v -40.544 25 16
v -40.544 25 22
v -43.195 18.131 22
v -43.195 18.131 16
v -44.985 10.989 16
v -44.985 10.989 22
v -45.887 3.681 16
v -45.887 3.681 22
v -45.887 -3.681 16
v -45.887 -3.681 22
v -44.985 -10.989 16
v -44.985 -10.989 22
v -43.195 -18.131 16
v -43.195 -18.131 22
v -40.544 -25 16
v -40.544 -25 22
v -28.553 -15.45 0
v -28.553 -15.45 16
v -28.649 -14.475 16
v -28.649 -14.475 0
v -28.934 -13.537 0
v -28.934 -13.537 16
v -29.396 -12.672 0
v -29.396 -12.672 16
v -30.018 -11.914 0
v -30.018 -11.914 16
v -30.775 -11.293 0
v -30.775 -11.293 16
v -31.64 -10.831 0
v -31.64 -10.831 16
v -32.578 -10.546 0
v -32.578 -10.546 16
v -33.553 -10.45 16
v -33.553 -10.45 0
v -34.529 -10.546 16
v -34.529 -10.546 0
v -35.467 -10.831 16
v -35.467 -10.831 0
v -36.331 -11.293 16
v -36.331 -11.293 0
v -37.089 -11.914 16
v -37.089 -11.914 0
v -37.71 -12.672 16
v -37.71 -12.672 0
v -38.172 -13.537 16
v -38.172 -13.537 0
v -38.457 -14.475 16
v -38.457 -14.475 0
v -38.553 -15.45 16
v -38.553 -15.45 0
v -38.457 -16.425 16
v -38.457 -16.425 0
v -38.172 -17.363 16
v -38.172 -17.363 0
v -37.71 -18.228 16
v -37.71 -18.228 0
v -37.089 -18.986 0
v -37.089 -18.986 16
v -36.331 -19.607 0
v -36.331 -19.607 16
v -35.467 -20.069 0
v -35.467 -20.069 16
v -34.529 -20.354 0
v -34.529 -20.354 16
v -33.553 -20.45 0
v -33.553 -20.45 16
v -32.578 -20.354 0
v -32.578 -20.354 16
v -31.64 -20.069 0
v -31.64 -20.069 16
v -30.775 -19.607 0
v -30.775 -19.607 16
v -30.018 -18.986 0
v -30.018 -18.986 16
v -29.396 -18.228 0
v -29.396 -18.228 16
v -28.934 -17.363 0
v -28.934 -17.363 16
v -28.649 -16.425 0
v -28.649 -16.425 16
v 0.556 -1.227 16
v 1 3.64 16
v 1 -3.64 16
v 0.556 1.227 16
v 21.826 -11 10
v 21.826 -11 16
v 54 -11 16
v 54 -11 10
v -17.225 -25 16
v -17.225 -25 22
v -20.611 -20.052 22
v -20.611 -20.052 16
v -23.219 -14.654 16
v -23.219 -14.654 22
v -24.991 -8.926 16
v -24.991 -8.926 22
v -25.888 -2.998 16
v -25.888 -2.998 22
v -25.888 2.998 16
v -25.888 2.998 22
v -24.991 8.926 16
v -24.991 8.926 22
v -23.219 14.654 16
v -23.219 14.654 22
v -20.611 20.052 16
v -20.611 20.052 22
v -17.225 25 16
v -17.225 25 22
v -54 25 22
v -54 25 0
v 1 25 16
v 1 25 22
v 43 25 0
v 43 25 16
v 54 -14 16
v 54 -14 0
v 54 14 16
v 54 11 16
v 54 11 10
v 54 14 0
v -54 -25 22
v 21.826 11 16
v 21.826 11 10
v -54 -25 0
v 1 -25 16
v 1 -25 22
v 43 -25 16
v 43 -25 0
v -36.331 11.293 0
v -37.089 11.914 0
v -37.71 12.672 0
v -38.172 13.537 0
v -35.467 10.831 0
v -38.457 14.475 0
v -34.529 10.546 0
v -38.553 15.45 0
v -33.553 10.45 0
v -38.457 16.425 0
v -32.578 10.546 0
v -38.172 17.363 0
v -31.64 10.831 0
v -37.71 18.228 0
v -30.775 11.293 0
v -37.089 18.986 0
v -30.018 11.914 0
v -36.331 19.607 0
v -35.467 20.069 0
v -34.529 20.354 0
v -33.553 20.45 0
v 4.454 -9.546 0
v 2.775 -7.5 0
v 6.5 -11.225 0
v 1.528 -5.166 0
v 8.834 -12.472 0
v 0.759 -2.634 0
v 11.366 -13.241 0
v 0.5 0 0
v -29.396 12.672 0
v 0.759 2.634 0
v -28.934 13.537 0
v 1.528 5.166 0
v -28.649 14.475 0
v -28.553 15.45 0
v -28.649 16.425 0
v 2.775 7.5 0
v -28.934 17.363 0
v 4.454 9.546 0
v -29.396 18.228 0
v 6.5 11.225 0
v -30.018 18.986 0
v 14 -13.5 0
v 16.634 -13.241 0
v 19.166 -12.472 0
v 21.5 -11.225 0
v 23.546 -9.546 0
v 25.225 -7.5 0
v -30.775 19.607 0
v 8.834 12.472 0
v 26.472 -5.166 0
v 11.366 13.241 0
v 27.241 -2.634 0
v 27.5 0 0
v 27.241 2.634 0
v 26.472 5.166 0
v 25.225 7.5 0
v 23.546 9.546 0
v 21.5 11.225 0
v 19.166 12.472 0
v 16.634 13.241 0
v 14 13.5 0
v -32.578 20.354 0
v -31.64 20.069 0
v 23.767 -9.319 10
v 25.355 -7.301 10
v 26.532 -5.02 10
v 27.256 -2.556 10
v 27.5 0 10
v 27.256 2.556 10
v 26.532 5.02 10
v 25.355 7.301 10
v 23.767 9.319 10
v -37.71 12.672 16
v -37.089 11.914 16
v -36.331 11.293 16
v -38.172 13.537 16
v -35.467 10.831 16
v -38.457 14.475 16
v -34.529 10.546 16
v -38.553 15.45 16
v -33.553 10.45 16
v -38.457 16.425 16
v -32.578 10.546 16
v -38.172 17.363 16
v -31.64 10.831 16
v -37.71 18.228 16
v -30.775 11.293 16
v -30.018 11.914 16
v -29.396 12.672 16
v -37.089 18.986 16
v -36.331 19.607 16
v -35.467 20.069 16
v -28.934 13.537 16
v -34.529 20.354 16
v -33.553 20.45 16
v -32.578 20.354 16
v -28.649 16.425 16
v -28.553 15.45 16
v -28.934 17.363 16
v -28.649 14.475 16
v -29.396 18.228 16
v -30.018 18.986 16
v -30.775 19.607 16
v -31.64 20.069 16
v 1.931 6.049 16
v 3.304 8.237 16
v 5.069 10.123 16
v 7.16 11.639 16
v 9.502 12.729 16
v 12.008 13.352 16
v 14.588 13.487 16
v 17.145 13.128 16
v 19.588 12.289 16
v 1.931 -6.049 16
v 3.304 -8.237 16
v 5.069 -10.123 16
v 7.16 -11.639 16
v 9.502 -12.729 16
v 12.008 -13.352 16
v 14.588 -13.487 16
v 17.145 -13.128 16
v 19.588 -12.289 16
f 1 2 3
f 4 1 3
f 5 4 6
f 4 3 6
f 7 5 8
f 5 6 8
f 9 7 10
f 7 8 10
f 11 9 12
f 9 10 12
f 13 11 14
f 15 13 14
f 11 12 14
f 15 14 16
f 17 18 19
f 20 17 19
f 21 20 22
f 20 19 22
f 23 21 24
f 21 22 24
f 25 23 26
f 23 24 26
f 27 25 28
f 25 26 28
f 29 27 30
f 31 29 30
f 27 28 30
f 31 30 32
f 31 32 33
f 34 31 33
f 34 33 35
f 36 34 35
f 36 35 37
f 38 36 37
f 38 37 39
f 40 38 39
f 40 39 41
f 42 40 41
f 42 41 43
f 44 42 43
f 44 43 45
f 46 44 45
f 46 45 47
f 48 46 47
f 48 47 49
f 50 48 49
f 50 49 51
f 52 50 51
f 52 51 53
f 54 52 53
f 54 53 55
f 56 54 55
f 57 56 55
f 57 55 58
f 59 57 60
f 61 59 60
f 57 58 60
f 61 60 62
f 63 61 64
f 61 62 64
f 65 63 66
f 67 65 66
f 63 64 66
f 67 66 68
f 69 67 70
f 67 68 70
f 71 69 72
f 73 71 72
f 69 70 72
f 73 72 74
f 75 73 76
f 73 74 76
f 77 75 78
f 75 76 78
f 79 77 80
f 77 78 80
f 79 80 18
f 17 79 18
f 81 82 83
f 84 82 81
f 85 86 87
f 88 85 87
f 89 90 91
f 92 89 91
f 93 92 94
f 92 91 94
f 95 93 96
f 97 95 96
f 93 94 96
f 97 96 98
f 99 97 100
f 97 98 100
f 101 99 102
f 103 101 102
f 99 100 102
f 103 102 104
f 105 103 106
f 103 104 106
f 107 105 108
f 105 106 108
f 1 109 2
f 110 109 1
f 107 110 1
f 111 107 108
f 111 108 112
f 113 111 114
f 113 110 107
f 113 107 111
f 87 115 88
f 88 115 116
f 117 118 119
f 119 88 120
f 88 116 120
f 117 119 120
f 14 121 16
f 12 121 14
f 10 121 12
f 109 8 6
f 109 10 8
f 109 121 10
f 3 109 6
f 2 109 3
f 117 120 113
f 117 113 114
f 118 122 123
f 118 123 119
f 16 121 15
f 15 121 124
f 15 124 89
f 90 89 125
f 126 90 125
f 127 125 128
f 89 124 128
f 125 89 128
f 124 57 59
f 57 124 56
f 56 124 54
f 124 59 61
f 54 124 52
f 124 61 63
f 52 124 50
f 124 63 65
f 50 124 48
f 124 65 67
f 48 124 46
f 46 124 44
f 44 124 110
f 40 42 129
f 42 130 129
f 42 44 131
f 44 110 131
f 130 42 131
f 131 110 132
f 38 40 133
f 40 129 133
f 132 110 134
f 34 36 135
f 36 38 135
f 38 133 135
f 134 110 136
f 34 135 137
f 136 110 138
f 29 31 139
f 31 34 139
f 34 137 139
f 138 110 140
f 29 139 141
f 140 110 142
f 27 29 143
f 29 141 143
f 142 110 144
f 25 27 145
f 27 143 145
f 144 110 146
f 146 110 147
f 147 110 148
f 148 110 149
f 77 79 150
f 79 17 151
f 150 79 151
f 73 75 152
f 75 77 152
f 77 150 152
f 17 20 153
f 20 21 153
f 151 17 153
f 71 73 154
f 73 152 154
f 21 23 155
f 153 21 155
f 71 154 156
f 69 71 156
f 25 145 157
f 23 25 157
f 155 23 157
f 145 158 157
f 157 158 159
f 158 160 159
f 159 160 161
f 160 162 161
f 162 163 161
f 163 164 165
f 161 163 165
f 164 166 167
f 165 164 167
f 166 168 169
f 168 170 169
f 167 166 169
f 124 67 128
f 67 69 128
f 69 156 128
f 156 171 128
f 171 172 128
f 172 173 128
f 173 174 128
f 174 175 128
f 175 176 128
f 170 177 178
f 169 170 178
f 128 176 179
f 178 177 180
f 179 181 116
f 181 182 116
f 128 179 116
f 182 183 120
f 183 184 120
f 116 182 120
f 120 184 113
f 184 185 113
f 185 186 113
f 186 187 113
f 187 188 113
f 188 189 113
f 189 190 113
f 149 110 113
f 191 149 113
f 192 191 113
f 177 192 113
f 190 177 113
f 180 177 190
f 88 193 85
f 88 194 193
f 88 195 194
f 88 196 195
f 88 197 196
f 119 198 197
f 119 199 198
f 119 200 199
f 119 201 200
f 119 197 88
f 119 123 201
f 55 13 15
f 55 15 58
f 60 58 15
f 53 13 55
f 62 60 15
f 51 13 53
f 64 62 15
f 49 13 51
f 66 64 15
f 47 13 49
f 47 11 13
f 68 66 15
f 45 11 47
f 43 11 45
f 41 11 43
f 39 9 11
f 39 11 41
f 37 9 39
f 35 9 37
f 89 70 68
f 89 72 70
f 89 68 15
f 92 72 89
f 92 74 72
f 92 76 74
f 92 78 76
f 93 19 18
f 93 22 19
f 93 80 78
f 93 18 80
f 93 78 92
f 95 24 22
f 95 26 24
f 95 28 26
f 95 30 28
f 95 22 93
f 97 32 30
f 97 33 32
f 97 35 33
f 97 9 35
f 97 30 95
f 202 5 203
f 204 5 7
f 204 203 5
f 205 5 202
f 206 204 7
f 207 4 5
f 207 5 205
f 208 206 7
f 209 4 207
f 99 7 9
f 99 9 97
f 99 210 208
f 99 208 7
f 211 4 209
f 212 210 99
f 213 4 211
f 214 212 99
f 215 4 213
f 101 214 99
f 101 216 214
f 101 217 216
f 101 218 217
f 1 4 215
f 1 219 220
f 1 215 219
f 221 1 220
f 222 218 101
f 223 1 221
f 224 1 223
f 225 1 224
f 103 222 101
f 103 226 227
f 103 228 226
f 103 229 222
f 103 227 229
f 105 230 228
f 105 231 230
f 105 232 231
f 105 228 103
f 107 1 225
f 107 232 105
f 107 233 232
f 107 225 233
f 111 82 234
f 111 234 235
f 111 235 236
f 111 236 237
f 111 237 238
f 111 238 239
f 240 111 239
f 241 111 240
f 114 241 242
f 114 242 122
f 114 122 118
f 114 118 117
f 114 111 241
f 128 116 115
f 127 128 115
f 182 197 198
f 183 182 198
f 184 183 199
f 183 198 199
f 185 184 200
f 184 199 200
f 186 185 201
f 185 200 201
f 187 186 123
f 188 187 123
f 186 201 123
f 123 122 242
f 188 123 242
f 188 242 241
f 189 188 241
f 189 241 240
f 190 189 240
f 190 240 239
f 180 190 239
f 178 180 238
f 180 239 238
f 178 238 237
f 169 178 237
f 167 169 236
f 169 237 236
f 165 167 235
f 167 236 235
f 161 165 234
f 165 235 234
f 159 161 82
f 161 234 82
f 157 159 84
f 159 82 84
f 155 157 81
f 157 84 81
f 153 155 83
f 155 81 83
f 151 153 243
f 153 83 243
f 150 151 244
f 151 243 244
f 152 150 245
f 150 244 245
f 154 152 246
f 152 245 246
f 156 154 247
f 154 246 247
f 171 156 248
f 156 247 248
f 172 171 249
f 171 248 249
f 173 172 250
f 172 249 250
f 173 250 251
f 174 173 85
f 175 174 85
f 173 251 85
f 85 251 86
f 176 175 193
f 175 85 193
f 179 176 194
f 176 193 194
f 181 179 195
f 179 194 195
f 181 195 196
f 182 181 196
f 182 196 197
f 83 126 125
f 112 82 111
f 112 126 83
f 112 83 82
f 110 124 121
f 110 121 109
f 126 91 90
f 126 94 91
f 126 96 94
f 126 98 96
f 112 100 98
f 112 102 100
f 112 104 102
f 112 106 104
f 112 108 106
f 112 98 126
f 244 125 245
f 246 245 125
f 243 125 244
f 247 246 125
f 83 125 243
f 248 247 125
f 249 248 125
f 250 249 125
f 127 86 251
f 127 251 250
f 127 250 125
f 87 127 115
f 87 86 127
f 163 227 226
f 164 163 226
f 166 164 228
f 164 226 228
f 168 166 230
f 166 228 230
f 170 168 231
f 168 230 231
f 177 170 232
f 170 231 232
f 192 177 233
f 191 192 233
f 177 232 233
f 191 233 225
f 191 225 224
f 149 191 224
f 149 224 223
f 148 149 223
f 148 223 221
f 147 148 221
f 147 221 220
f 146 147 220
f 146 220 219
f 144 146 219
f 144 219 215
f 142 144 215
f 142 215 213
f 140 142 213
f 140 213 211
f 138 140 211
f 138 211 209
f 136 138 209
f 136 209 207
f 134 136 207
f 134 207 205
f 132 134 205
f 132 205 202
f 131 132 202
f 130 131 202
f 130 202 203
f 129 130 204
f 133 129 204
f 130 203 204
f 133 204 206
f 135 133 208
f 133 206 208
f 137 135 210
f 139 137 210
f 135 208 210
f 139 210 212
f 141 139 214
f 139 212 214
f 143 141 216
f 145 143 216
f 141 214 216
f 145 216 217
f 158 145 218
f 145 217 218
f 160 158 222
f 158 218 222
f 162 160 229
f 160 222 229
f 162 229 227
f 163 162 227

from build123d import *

# Parameters (mm, degrees)
SKETCH1_W           = 108
SKETCH1_H           = 50
BOSS_EXTRUDE1_DEPTH = 22
SKETCH2_W           = 53
SKETCH2_H           = 50
CUT_EXTRUDE1_DEPTH  = 6
CUT_EXTRUDE2_REACH  = 63.62
SKETCH3_R           = 13.5
SKETCH4_W           = 40
SKETCH4_H           = 22
CUT_EXTRUDE3_DEPTH  = 6
CHAMFER1_SIZE       = 11
CUT_EXTRUDE4_REACH  = 63.62
SKETCH5_R           = 5


with BuildPart() as part:
    # Sketch1 → Boss-Extrude1 (new body)
    with BuildSketch(Plane.XY):
        Rectangle(SKETCH1_W, SKETCH1_H)
    extrude(amount=BOSS_EXTRUDE1_DEPTH)

    # Sketch2 → Cut-Extrude1 (cut)
    with BuildSketch(Plane.XY.offset(22)):
        with Locations((27.5, 0)):
            Rectangle(SKETCH2_W, SKETCH2_H)
        with BuildLine():
            Line((-17.224989992, 25), (-40.543560573, 25))
            ThreePointArc((-40.543560573, 25), (-46, 0), (-40.543560573, -25))
            Line((-40.543560573, -25), (-17.224989992, -25))
            ThreePointArc((-17.224989992, -25), (-26, 0), (-17.224989992, 25))
        make_face()
    extrude(amount=-CUT_EXTRUDE1_DEPTH, mode=Mode.SUBTRACT)

    # Sketch3 → Cut-Extrude2 (cut, up to next)
    with BuildSketch(Plane.XY.offset(16), mode=Mode.PRIVATE) as cut_extrude2_sk1:
        with Locations((14, 0)):
            Circle(SKETCH3_R)
    cut_extrude2_tool1 = extrude(cut_extrude2_sk1.sketch, amount=-CUT_EXTRUDE2_REACH, mode=Mode.PRIVATE) & part.part
    add(cut_extrude2_tool1.solids().sort_by_distance((14, 0, 16))[0], mode=Mode.SUBTRACT)

    # Sketch4 → Cut-Extrude3 (cut)
    with BuildSketch(Plane.XY.offset(16)):
        with Locations((34, 0)):
            Rectangle(SKETCH4_W, SKETCH4_H)
    extrude(amount=-CUT_EXTRUDE3_DEPTH, mode=Mode.SUBTRACT)

    # Chamfer1
    chamfer1_edges = [part.edges().sort_by_distance(p)[0] for p in [
        (54, -25, 8),
        (54, 25, 8),
    ]]
    chamfer(chamfer1_edges, length=CHAMFER1_SIZE)

    # Sketch5 → Cut-Extrude4 (cut, up to next)
    with BuildSketch(Plane.XY.offset(16), mode=Mode.PRIVATE) as cut_extrude4_sk1:
        with Locations((-33.553101897, 15.45)):
            Circle(SKETCH5_R)
    cut_extrude4_tool1 = extrude(cut_extrude4_sk1.sketch, amount=-CUT_EXTRUDE4_REACH, mode=Mode.PRIVATE) & part.part
    # Sketch5 → Cut-Extrude4 (cut, up to next)
    with BuildSketch(Plane.XY.offset(16), mode=Mode.PRIVATE) as cut_extrude4_sk2:
        with Locations((-33.553101897, -15.45)):
            Circle(SKETCH5_R)
    cut_extrude4_tool2 = extrude(cut_extrude4_sk2.sketch, amount=-CUT_EXTRUDE4_REACH, mode=Mode.PRIVATE) & part.part
    add(cut_extrude4_tool1.solids().sort_by_distance((-33.553102, 15.45, 16))[0], mode=Mode.SUBTRACT)
    add(cut_extrude4_tool2.solids().sort_by_distance((-33.553102, -15.45, 16))[0], mode=Mode.SUBTRACT)


solid = part.part
